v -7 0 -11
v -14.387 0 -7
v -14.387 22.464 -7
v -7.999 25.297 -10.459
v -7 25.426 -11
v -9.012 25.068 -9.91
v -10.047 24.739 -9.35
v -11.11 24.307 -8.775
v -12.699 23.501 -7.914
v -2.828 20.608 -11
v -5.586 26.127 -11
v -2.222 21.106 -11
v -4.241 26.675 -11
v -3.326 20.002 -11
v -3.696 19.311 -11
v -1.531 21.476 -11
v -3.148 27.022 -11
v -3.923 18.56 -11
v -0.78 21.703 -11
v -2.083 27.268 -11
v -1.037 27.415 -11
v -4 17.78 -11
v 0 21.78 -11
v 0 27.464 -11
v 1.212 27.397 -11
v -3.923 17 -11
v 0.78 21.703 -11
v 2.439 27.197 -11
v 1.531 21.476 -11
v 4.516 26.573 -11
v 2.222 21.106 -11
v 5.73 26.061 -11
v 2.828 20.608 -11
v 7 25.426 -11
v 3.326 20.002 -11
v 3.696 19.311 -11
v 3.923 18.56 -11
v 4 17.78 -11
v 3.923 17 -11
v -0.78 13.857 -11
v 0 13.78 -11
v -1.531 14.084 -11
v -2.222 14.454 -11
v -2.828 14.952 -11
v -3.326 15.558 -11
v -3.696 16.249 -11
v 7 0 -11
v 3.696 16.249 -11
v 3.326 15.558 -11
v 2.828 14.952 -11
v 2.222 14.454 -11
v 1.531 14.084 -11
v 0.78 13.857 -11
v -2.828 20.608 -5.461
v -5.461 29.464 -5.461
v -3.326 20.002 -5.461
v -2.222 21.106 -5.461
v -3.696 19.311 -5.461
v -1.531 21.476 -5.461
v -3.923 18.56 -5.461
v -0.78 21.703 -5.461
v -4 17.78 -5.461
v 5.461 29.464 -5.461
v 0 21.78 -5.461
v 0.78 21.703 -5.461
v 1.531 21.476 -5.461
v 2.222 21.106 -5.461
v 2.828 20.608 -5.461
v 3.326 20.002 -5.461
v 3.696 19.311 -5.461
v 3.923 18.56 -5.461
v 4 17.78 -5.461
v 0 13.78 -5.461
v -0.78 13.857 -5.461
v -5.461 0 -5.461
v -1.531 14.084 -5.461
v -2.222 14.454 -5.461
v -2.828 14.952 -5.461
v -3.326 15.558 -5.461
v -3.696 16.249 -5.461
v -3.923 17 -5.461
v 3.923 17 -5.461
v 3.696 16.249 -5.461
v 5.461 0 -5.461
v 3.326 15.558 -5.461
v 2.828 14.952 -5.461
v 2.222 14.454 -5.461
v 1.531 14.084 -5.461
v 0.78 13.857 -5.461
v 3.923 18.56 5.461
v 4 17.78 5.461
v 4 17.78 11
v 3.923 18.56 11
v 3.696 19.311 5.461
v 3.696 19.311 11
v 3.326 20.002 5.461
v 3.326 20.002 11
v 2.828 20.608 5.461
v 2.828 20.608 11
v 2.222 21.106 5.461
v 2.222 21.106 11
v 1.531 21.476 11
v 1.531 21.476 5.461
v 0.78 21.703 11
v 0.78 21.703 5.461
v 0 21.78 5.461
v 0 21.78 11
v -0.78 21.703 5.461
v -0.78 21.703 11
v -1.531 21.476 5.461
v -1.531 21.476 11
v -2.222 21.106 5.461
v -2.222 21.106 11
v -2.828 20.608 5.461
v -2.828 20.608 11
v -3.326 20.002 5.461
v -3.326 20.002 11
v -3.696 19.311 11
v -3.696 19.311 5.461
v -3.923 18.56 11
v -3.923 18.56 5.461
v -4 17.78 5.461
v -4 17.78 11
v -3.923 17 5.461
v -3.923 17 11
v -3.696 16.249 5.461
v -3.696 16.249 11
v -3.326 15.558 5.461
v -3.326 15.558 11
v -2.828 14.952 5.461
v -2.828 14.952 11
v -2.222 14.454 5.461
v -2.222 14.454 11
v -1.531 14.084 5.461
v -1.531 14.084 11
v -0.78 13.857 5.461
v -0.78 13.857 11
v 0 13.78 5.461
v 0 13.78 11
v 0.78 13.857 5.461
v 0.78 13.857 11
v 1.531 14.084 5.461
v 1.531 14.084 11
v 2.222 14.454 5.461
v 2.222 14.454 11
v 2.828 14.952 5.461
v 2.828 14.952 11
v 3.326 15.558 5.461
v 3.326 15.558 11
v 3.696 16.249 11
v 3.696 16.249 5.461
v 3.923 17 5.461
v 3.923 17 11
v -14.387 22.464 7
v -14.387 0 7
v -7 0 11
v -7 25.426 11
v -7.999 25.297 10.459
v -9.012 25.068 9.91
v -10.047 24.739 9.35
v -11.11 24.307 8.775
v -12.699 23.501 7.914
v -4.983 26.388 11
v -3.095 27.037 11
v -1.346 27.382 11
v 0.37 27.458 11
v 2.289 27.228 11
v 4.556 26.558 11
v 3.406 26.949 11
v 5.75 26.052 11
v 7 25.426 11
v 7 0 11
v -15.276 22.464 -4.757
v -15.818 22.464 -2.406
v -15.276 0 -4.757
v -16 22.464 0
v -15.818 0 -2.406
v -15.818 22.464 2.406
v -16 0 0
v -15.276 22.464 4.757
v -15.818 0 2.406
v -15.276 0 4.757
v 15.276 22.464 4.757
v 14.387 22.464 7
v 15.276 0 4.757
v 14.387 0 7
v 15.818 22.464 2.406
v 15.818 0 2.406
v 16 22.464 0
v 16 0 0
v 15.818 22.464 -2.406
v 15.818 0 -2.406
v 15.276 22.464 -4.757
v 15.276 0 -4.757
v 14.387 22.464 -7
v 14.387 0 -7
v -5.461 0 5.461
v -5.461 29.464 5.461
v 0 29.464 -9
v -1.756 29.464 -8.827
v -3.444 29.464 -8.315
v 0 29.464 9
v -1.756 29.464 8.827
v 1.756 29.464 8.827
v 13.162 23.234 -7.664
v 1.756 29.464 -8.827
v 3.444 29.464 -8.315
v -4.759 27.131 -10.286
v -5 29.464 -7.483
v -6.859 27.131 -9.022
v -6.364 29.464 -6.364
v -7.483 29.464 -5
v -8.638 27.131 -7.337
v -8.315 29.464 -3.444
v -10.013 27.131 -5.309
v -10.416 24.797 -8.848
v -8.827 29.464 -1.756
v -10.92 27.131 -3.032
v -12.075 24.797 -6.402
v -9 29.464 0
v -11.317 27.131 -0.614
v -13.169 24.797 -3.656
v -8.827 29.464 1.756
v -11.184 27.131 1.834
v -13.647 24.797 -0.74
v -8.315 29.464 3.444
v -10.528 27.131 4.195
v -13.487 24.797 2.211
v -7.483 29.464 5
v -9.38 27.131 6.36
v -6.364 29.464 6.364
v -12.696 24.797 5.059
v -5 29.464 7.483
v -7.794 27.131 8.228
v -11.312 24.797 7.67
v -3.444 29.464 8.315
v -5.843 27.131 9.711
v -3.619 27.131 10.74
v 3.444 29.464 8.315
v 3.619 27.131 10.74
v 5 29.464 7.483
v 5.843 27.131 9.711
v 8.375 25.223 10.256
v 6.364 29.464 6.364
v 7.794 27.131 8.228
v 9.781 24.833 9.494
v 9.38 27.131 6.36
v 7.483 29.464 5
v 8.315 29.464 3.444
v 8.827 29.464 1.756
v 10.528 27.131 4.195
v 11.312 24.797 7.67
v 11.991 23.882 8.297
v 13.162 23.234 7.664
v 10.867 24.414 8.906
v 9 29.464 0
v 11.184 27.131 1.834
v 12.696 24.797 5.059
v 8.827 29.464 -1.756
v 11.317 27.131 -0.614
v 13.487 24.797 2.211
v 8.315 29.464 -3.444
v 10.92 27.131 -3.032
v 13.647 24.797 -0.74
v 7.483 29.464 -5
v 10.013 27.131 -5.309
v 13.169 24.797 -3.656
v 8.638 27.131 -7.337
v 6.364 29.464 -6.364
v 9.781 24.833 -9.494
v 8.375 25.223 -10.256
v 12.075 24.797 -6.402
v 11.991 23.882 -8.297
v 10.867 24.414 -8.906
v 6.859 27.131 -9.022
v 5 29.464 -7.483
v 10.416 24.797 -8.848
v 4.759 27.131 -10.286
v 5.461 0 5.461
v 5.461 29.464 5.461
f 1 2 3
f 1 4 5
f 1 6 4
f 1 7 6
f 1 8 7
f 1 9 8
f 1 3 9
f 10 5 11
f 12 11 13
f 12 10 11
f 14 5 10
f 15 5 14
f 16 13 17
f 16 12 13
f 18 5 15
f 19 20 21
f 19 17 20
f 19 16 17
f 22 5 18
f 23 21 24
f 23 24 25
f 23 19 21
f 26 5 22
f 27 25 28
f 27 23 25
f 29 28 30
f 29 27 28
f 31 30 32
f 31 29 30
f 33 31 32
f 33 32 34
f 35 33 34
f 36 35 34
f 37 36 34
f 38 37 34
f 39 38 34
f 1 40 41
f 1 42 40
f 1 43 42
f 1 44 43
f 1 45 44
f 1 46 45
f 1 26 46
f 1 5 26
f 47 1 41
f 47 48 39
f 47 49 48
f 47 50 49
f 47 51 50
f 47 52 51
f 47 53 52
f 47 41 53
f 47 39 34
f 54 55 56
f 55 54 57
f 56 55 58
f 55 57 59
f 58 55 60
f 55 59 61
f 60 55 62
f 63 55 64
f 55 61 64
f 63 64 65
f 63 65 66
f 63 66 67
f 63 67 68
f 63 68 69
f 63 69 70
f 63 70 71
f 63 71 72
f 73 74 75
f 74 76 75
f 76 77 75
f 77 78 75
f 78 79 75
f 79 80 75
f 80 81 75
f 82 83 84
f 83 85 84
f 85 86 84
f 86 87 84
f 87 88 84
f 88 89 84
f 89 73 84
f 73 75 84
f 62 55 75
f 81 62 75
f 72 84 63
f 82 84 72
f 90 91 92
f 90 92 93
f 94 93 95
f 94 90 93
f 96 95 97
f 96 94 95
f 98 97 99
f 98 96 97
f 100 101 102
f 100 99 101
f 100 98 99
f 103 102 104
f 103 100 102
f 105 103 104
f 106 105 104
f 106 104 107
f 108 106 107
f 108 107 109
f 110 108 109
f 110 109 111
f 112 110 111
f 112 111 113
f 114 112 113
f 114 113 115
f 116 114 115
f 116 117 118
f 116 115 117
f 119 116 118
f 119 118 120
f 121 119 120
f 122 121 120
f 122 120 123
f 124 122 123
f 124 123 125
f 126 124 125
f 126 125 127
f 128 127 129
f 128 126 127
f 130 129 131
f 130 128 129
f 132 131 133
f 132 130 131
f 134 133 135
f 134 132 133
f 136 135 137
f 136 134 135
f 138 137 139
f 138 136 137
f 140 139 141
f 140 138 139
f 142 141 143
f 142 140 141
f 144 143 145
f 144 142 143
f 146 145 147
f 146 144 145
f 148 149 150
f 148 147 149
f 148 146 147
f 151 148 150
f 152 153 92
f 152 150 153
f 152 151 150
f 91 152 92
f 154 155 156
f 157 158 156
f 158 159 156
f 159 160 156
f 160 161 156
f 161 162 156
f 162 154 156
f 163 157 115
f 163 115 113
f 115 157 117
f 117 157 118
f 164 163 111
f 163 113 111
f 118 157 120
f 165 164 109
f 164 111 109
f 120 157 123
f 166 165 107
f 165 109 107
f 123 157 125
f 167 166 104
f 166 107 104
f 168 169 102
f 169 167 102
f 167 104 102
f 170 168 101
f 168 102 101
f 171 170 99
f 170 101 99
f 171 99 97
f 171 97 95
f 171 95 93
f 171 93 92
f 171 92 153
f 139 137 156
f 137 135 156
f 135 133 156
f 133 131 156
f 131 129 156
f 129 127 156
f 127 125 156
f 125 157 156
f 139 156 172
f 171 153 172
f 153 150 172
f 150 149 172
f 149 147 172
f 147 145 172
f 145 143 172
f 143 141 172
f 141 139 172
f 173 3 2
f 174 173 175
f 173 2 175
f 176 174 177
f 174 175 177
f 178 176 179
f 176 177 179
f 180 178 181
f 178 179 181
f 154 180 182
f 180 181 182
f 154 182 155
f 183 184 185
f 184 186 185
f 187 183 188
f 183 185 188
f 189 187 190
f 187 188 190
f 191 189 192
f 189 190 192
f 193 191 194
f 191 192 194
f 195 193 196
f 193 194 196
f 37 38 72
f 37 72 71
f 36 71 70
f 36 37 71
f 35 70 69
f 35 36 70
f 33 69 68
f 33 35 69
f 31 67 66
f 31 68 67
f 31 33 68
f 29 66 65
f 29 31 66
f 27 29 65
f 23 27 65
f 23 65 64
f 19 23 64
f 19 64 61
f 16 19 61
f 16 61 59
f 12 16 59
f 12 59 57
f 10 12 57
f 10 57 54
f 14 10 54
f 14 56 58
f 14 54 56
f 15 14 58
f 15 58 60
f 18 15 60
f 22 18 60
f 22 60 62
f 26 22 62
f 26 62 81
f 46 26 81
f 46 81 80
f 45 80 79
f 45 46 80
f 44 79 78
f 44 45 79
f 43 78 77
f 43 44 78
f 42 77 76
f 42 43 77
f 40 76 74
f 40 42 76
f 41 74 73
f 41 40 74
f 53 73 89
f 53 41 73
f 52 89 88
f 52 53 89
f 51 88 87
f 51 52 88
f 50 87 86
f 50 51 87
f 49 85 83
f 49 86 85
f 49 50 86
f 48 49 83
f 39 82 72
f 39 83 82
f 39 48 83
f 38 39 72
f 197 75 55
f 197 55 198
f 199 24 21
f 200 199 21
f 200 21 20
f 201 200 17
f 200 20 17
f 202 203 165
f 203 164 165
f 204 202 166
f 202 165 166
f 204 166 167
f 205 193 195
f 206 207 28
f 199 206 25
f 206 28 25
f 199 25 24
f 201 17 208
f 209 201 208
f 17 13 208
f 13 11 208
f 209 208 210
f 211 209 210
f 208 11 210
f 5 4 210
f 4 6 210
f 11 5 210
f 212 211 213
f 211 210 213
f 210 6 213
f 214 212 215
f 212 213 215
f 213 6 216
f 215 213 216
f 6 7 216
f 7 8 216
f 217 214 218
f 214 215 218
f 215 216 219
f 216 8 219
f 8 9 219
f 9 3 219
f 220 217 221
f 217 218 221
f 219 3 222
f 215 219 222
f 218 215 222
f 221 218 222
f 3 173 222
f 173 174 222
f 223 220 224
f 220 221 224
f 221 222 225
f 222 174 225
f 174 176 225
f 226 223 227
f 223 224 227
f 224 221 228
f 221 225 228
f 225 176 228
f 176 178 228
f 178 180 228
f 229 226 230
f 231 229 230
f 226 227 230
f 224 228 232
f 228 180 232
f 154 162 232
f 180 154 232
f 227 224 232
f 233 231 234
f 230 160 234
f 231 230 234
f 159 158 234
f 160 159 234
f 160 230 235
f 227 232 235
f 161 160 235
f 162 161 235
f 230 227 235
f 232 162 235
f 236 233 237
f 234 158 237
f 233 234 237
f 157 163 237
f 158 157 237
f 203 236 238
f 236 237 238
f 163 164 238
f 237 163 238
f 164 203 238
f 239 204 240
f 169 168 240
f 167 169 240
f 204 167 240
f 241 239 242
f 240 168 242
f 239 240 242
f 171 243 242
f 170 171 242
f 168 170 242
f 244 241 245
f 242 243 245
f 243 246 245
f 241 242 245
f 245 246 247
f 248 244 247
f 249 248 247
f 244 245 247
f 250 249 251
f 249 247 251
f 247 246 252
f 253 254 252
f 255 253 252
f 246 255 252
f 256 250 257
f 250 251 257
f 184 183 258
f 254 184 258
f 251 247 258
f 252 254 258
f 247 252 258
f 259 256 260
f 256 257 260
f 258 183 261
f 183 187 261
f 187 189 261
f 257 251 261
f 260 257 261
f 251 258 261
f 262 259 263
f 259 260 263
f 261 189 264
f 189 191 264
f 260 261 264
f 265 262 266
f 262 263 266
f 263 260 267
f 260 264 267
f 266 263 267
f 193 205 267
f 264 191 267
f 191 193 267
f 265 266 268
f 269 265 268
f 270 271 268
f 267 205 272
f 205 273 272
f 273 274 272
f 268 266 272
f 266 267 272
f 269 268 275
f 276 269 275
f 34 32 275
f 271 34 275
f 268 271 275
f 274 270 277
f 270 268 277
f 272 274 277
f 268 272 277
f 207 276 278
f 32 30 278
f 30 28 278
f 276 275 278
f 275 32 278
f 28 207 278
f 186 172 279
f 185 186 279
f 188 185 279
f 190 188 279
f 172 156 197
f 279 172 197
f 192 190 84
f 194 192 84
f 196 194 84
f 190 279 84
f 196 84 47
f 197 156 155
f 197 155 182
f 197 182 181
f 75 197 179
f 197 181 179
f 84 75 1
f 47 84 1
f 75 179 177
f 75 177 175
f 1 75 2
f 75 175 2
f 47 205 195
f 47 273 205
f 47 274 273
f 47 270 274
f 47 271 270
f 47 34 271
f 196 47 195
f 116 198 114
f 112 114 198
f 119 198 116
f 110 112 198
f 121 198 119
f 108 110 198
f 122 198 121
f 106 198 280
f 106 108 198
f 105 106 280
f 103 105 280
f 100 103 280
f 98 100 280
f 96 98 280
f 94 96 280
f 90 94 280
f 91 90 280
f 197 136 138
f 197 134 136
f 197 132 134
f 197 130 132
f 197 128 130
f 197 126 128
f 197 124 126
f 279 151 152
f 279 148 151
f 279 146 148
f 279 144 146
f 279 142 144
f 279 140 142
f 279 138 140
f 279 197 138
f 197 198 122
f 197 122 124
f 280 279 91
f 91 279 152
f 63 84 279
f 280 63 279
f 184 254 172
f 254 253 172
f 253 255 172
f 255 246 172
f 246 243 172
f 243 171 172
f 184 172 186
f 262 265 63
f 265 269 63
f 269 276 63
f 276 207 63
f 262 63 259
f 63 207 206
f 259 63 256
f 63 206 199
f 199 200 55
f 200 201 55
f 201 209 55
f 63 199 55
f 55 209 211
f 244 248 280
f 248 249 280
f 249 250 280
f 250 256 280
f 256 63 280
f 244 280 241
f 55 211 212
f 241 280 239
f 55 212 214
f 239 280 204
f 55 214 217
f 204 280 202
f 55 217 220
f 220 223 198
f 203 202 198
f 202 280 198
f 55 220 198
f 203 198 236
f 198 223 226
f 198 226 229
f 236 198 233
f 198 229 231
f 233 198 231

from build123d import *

# Parameters (mm, degrees)
CUT_EXTRUDE4_DEPTH      = 38.150064549
CUT_EXTRUDE5_DEPTH      = 36.286361331
CUT_EXTRUDE5_DEPTH_BACK = 36.286361331
SKETCH3_R               = 4
SKETCH4_W               = 10.922
SKETCH4_H               = 10.922
CUT_EXTRUDE6_DEPTH      = 36.286361446


with BuildPart() as part:
    # Sketch1 → Revolve1 (revolve)
    with BuildSketch(Plane.XY, mode=Mode.PRIVATE) as revolve1_sk:
        Polygon((9, 29.464), (16, 22.464), (16, 0), (4.925, 0), (4.925, 29.464), align=None)
    revolve(revolve1_sk.sketch.rotate(Axis((0, 0, 0), (0, 1, 0)), 90), axis=Axis((0, 0, 0), (0, 1, 0)))

    # Sketch2 → Cut-Extrude4 (cut, through all)
    with BuildSketch(Plane(origin=(0, 0, 0), x_dir=(1, 0, 0), z_dir=(0, 1, 0))):
        with BuildLine():
            Line((7, 11), (14.38749457, 7))
            ThreePointArc((14.38749457, 7), (0, 16), (-14.38749457, 7))
            Line((-14.38749457, 7), (-7, 11))
            Line((-7, 11), (7, 11))
        make_face()
        with BuildLine():
            ThreePointArc((14.38749457, -7), (0, -16), (-14.38749457, -7))
            Line((-14.38749457, -7), (-7, -11))
            Line((-7, -11), (7, -11))
            Line((7, -11), (14.38749457, -7))
        make_face()
    extrude(amount=CUT_EXTRUDE4_DEPTH, mode=Mode.SUBTRACT)

    # Sketch3 → Cut-Extrude5 (cut, two sides: drawn at the far end of the back side and taken through both)
    with BuildSketch(Plane.XY.offset(-CUT_EXTRUDE5_DEPTH_BACK)):
        with Locations((0, 17.78)):
            Circle(SKETCH3_R)
    extrude(amount=CUT_EXTRUDE5_DEPTH + CUT_EXTRUDE5_DEPTH_BACK, mode=Mode.SUBTRACT)

    # Sketch4 → Cut-Extrude6 (cut, through all)
    with BuildSketch(Plane.XZ):
        Rectangle(SKETCH4_W, SKETCH4_H)
    extrude(amount=-CUT_EXTRUDE6_DEPTH, mode=Mode.SUBTRACT)


solid = part.part
